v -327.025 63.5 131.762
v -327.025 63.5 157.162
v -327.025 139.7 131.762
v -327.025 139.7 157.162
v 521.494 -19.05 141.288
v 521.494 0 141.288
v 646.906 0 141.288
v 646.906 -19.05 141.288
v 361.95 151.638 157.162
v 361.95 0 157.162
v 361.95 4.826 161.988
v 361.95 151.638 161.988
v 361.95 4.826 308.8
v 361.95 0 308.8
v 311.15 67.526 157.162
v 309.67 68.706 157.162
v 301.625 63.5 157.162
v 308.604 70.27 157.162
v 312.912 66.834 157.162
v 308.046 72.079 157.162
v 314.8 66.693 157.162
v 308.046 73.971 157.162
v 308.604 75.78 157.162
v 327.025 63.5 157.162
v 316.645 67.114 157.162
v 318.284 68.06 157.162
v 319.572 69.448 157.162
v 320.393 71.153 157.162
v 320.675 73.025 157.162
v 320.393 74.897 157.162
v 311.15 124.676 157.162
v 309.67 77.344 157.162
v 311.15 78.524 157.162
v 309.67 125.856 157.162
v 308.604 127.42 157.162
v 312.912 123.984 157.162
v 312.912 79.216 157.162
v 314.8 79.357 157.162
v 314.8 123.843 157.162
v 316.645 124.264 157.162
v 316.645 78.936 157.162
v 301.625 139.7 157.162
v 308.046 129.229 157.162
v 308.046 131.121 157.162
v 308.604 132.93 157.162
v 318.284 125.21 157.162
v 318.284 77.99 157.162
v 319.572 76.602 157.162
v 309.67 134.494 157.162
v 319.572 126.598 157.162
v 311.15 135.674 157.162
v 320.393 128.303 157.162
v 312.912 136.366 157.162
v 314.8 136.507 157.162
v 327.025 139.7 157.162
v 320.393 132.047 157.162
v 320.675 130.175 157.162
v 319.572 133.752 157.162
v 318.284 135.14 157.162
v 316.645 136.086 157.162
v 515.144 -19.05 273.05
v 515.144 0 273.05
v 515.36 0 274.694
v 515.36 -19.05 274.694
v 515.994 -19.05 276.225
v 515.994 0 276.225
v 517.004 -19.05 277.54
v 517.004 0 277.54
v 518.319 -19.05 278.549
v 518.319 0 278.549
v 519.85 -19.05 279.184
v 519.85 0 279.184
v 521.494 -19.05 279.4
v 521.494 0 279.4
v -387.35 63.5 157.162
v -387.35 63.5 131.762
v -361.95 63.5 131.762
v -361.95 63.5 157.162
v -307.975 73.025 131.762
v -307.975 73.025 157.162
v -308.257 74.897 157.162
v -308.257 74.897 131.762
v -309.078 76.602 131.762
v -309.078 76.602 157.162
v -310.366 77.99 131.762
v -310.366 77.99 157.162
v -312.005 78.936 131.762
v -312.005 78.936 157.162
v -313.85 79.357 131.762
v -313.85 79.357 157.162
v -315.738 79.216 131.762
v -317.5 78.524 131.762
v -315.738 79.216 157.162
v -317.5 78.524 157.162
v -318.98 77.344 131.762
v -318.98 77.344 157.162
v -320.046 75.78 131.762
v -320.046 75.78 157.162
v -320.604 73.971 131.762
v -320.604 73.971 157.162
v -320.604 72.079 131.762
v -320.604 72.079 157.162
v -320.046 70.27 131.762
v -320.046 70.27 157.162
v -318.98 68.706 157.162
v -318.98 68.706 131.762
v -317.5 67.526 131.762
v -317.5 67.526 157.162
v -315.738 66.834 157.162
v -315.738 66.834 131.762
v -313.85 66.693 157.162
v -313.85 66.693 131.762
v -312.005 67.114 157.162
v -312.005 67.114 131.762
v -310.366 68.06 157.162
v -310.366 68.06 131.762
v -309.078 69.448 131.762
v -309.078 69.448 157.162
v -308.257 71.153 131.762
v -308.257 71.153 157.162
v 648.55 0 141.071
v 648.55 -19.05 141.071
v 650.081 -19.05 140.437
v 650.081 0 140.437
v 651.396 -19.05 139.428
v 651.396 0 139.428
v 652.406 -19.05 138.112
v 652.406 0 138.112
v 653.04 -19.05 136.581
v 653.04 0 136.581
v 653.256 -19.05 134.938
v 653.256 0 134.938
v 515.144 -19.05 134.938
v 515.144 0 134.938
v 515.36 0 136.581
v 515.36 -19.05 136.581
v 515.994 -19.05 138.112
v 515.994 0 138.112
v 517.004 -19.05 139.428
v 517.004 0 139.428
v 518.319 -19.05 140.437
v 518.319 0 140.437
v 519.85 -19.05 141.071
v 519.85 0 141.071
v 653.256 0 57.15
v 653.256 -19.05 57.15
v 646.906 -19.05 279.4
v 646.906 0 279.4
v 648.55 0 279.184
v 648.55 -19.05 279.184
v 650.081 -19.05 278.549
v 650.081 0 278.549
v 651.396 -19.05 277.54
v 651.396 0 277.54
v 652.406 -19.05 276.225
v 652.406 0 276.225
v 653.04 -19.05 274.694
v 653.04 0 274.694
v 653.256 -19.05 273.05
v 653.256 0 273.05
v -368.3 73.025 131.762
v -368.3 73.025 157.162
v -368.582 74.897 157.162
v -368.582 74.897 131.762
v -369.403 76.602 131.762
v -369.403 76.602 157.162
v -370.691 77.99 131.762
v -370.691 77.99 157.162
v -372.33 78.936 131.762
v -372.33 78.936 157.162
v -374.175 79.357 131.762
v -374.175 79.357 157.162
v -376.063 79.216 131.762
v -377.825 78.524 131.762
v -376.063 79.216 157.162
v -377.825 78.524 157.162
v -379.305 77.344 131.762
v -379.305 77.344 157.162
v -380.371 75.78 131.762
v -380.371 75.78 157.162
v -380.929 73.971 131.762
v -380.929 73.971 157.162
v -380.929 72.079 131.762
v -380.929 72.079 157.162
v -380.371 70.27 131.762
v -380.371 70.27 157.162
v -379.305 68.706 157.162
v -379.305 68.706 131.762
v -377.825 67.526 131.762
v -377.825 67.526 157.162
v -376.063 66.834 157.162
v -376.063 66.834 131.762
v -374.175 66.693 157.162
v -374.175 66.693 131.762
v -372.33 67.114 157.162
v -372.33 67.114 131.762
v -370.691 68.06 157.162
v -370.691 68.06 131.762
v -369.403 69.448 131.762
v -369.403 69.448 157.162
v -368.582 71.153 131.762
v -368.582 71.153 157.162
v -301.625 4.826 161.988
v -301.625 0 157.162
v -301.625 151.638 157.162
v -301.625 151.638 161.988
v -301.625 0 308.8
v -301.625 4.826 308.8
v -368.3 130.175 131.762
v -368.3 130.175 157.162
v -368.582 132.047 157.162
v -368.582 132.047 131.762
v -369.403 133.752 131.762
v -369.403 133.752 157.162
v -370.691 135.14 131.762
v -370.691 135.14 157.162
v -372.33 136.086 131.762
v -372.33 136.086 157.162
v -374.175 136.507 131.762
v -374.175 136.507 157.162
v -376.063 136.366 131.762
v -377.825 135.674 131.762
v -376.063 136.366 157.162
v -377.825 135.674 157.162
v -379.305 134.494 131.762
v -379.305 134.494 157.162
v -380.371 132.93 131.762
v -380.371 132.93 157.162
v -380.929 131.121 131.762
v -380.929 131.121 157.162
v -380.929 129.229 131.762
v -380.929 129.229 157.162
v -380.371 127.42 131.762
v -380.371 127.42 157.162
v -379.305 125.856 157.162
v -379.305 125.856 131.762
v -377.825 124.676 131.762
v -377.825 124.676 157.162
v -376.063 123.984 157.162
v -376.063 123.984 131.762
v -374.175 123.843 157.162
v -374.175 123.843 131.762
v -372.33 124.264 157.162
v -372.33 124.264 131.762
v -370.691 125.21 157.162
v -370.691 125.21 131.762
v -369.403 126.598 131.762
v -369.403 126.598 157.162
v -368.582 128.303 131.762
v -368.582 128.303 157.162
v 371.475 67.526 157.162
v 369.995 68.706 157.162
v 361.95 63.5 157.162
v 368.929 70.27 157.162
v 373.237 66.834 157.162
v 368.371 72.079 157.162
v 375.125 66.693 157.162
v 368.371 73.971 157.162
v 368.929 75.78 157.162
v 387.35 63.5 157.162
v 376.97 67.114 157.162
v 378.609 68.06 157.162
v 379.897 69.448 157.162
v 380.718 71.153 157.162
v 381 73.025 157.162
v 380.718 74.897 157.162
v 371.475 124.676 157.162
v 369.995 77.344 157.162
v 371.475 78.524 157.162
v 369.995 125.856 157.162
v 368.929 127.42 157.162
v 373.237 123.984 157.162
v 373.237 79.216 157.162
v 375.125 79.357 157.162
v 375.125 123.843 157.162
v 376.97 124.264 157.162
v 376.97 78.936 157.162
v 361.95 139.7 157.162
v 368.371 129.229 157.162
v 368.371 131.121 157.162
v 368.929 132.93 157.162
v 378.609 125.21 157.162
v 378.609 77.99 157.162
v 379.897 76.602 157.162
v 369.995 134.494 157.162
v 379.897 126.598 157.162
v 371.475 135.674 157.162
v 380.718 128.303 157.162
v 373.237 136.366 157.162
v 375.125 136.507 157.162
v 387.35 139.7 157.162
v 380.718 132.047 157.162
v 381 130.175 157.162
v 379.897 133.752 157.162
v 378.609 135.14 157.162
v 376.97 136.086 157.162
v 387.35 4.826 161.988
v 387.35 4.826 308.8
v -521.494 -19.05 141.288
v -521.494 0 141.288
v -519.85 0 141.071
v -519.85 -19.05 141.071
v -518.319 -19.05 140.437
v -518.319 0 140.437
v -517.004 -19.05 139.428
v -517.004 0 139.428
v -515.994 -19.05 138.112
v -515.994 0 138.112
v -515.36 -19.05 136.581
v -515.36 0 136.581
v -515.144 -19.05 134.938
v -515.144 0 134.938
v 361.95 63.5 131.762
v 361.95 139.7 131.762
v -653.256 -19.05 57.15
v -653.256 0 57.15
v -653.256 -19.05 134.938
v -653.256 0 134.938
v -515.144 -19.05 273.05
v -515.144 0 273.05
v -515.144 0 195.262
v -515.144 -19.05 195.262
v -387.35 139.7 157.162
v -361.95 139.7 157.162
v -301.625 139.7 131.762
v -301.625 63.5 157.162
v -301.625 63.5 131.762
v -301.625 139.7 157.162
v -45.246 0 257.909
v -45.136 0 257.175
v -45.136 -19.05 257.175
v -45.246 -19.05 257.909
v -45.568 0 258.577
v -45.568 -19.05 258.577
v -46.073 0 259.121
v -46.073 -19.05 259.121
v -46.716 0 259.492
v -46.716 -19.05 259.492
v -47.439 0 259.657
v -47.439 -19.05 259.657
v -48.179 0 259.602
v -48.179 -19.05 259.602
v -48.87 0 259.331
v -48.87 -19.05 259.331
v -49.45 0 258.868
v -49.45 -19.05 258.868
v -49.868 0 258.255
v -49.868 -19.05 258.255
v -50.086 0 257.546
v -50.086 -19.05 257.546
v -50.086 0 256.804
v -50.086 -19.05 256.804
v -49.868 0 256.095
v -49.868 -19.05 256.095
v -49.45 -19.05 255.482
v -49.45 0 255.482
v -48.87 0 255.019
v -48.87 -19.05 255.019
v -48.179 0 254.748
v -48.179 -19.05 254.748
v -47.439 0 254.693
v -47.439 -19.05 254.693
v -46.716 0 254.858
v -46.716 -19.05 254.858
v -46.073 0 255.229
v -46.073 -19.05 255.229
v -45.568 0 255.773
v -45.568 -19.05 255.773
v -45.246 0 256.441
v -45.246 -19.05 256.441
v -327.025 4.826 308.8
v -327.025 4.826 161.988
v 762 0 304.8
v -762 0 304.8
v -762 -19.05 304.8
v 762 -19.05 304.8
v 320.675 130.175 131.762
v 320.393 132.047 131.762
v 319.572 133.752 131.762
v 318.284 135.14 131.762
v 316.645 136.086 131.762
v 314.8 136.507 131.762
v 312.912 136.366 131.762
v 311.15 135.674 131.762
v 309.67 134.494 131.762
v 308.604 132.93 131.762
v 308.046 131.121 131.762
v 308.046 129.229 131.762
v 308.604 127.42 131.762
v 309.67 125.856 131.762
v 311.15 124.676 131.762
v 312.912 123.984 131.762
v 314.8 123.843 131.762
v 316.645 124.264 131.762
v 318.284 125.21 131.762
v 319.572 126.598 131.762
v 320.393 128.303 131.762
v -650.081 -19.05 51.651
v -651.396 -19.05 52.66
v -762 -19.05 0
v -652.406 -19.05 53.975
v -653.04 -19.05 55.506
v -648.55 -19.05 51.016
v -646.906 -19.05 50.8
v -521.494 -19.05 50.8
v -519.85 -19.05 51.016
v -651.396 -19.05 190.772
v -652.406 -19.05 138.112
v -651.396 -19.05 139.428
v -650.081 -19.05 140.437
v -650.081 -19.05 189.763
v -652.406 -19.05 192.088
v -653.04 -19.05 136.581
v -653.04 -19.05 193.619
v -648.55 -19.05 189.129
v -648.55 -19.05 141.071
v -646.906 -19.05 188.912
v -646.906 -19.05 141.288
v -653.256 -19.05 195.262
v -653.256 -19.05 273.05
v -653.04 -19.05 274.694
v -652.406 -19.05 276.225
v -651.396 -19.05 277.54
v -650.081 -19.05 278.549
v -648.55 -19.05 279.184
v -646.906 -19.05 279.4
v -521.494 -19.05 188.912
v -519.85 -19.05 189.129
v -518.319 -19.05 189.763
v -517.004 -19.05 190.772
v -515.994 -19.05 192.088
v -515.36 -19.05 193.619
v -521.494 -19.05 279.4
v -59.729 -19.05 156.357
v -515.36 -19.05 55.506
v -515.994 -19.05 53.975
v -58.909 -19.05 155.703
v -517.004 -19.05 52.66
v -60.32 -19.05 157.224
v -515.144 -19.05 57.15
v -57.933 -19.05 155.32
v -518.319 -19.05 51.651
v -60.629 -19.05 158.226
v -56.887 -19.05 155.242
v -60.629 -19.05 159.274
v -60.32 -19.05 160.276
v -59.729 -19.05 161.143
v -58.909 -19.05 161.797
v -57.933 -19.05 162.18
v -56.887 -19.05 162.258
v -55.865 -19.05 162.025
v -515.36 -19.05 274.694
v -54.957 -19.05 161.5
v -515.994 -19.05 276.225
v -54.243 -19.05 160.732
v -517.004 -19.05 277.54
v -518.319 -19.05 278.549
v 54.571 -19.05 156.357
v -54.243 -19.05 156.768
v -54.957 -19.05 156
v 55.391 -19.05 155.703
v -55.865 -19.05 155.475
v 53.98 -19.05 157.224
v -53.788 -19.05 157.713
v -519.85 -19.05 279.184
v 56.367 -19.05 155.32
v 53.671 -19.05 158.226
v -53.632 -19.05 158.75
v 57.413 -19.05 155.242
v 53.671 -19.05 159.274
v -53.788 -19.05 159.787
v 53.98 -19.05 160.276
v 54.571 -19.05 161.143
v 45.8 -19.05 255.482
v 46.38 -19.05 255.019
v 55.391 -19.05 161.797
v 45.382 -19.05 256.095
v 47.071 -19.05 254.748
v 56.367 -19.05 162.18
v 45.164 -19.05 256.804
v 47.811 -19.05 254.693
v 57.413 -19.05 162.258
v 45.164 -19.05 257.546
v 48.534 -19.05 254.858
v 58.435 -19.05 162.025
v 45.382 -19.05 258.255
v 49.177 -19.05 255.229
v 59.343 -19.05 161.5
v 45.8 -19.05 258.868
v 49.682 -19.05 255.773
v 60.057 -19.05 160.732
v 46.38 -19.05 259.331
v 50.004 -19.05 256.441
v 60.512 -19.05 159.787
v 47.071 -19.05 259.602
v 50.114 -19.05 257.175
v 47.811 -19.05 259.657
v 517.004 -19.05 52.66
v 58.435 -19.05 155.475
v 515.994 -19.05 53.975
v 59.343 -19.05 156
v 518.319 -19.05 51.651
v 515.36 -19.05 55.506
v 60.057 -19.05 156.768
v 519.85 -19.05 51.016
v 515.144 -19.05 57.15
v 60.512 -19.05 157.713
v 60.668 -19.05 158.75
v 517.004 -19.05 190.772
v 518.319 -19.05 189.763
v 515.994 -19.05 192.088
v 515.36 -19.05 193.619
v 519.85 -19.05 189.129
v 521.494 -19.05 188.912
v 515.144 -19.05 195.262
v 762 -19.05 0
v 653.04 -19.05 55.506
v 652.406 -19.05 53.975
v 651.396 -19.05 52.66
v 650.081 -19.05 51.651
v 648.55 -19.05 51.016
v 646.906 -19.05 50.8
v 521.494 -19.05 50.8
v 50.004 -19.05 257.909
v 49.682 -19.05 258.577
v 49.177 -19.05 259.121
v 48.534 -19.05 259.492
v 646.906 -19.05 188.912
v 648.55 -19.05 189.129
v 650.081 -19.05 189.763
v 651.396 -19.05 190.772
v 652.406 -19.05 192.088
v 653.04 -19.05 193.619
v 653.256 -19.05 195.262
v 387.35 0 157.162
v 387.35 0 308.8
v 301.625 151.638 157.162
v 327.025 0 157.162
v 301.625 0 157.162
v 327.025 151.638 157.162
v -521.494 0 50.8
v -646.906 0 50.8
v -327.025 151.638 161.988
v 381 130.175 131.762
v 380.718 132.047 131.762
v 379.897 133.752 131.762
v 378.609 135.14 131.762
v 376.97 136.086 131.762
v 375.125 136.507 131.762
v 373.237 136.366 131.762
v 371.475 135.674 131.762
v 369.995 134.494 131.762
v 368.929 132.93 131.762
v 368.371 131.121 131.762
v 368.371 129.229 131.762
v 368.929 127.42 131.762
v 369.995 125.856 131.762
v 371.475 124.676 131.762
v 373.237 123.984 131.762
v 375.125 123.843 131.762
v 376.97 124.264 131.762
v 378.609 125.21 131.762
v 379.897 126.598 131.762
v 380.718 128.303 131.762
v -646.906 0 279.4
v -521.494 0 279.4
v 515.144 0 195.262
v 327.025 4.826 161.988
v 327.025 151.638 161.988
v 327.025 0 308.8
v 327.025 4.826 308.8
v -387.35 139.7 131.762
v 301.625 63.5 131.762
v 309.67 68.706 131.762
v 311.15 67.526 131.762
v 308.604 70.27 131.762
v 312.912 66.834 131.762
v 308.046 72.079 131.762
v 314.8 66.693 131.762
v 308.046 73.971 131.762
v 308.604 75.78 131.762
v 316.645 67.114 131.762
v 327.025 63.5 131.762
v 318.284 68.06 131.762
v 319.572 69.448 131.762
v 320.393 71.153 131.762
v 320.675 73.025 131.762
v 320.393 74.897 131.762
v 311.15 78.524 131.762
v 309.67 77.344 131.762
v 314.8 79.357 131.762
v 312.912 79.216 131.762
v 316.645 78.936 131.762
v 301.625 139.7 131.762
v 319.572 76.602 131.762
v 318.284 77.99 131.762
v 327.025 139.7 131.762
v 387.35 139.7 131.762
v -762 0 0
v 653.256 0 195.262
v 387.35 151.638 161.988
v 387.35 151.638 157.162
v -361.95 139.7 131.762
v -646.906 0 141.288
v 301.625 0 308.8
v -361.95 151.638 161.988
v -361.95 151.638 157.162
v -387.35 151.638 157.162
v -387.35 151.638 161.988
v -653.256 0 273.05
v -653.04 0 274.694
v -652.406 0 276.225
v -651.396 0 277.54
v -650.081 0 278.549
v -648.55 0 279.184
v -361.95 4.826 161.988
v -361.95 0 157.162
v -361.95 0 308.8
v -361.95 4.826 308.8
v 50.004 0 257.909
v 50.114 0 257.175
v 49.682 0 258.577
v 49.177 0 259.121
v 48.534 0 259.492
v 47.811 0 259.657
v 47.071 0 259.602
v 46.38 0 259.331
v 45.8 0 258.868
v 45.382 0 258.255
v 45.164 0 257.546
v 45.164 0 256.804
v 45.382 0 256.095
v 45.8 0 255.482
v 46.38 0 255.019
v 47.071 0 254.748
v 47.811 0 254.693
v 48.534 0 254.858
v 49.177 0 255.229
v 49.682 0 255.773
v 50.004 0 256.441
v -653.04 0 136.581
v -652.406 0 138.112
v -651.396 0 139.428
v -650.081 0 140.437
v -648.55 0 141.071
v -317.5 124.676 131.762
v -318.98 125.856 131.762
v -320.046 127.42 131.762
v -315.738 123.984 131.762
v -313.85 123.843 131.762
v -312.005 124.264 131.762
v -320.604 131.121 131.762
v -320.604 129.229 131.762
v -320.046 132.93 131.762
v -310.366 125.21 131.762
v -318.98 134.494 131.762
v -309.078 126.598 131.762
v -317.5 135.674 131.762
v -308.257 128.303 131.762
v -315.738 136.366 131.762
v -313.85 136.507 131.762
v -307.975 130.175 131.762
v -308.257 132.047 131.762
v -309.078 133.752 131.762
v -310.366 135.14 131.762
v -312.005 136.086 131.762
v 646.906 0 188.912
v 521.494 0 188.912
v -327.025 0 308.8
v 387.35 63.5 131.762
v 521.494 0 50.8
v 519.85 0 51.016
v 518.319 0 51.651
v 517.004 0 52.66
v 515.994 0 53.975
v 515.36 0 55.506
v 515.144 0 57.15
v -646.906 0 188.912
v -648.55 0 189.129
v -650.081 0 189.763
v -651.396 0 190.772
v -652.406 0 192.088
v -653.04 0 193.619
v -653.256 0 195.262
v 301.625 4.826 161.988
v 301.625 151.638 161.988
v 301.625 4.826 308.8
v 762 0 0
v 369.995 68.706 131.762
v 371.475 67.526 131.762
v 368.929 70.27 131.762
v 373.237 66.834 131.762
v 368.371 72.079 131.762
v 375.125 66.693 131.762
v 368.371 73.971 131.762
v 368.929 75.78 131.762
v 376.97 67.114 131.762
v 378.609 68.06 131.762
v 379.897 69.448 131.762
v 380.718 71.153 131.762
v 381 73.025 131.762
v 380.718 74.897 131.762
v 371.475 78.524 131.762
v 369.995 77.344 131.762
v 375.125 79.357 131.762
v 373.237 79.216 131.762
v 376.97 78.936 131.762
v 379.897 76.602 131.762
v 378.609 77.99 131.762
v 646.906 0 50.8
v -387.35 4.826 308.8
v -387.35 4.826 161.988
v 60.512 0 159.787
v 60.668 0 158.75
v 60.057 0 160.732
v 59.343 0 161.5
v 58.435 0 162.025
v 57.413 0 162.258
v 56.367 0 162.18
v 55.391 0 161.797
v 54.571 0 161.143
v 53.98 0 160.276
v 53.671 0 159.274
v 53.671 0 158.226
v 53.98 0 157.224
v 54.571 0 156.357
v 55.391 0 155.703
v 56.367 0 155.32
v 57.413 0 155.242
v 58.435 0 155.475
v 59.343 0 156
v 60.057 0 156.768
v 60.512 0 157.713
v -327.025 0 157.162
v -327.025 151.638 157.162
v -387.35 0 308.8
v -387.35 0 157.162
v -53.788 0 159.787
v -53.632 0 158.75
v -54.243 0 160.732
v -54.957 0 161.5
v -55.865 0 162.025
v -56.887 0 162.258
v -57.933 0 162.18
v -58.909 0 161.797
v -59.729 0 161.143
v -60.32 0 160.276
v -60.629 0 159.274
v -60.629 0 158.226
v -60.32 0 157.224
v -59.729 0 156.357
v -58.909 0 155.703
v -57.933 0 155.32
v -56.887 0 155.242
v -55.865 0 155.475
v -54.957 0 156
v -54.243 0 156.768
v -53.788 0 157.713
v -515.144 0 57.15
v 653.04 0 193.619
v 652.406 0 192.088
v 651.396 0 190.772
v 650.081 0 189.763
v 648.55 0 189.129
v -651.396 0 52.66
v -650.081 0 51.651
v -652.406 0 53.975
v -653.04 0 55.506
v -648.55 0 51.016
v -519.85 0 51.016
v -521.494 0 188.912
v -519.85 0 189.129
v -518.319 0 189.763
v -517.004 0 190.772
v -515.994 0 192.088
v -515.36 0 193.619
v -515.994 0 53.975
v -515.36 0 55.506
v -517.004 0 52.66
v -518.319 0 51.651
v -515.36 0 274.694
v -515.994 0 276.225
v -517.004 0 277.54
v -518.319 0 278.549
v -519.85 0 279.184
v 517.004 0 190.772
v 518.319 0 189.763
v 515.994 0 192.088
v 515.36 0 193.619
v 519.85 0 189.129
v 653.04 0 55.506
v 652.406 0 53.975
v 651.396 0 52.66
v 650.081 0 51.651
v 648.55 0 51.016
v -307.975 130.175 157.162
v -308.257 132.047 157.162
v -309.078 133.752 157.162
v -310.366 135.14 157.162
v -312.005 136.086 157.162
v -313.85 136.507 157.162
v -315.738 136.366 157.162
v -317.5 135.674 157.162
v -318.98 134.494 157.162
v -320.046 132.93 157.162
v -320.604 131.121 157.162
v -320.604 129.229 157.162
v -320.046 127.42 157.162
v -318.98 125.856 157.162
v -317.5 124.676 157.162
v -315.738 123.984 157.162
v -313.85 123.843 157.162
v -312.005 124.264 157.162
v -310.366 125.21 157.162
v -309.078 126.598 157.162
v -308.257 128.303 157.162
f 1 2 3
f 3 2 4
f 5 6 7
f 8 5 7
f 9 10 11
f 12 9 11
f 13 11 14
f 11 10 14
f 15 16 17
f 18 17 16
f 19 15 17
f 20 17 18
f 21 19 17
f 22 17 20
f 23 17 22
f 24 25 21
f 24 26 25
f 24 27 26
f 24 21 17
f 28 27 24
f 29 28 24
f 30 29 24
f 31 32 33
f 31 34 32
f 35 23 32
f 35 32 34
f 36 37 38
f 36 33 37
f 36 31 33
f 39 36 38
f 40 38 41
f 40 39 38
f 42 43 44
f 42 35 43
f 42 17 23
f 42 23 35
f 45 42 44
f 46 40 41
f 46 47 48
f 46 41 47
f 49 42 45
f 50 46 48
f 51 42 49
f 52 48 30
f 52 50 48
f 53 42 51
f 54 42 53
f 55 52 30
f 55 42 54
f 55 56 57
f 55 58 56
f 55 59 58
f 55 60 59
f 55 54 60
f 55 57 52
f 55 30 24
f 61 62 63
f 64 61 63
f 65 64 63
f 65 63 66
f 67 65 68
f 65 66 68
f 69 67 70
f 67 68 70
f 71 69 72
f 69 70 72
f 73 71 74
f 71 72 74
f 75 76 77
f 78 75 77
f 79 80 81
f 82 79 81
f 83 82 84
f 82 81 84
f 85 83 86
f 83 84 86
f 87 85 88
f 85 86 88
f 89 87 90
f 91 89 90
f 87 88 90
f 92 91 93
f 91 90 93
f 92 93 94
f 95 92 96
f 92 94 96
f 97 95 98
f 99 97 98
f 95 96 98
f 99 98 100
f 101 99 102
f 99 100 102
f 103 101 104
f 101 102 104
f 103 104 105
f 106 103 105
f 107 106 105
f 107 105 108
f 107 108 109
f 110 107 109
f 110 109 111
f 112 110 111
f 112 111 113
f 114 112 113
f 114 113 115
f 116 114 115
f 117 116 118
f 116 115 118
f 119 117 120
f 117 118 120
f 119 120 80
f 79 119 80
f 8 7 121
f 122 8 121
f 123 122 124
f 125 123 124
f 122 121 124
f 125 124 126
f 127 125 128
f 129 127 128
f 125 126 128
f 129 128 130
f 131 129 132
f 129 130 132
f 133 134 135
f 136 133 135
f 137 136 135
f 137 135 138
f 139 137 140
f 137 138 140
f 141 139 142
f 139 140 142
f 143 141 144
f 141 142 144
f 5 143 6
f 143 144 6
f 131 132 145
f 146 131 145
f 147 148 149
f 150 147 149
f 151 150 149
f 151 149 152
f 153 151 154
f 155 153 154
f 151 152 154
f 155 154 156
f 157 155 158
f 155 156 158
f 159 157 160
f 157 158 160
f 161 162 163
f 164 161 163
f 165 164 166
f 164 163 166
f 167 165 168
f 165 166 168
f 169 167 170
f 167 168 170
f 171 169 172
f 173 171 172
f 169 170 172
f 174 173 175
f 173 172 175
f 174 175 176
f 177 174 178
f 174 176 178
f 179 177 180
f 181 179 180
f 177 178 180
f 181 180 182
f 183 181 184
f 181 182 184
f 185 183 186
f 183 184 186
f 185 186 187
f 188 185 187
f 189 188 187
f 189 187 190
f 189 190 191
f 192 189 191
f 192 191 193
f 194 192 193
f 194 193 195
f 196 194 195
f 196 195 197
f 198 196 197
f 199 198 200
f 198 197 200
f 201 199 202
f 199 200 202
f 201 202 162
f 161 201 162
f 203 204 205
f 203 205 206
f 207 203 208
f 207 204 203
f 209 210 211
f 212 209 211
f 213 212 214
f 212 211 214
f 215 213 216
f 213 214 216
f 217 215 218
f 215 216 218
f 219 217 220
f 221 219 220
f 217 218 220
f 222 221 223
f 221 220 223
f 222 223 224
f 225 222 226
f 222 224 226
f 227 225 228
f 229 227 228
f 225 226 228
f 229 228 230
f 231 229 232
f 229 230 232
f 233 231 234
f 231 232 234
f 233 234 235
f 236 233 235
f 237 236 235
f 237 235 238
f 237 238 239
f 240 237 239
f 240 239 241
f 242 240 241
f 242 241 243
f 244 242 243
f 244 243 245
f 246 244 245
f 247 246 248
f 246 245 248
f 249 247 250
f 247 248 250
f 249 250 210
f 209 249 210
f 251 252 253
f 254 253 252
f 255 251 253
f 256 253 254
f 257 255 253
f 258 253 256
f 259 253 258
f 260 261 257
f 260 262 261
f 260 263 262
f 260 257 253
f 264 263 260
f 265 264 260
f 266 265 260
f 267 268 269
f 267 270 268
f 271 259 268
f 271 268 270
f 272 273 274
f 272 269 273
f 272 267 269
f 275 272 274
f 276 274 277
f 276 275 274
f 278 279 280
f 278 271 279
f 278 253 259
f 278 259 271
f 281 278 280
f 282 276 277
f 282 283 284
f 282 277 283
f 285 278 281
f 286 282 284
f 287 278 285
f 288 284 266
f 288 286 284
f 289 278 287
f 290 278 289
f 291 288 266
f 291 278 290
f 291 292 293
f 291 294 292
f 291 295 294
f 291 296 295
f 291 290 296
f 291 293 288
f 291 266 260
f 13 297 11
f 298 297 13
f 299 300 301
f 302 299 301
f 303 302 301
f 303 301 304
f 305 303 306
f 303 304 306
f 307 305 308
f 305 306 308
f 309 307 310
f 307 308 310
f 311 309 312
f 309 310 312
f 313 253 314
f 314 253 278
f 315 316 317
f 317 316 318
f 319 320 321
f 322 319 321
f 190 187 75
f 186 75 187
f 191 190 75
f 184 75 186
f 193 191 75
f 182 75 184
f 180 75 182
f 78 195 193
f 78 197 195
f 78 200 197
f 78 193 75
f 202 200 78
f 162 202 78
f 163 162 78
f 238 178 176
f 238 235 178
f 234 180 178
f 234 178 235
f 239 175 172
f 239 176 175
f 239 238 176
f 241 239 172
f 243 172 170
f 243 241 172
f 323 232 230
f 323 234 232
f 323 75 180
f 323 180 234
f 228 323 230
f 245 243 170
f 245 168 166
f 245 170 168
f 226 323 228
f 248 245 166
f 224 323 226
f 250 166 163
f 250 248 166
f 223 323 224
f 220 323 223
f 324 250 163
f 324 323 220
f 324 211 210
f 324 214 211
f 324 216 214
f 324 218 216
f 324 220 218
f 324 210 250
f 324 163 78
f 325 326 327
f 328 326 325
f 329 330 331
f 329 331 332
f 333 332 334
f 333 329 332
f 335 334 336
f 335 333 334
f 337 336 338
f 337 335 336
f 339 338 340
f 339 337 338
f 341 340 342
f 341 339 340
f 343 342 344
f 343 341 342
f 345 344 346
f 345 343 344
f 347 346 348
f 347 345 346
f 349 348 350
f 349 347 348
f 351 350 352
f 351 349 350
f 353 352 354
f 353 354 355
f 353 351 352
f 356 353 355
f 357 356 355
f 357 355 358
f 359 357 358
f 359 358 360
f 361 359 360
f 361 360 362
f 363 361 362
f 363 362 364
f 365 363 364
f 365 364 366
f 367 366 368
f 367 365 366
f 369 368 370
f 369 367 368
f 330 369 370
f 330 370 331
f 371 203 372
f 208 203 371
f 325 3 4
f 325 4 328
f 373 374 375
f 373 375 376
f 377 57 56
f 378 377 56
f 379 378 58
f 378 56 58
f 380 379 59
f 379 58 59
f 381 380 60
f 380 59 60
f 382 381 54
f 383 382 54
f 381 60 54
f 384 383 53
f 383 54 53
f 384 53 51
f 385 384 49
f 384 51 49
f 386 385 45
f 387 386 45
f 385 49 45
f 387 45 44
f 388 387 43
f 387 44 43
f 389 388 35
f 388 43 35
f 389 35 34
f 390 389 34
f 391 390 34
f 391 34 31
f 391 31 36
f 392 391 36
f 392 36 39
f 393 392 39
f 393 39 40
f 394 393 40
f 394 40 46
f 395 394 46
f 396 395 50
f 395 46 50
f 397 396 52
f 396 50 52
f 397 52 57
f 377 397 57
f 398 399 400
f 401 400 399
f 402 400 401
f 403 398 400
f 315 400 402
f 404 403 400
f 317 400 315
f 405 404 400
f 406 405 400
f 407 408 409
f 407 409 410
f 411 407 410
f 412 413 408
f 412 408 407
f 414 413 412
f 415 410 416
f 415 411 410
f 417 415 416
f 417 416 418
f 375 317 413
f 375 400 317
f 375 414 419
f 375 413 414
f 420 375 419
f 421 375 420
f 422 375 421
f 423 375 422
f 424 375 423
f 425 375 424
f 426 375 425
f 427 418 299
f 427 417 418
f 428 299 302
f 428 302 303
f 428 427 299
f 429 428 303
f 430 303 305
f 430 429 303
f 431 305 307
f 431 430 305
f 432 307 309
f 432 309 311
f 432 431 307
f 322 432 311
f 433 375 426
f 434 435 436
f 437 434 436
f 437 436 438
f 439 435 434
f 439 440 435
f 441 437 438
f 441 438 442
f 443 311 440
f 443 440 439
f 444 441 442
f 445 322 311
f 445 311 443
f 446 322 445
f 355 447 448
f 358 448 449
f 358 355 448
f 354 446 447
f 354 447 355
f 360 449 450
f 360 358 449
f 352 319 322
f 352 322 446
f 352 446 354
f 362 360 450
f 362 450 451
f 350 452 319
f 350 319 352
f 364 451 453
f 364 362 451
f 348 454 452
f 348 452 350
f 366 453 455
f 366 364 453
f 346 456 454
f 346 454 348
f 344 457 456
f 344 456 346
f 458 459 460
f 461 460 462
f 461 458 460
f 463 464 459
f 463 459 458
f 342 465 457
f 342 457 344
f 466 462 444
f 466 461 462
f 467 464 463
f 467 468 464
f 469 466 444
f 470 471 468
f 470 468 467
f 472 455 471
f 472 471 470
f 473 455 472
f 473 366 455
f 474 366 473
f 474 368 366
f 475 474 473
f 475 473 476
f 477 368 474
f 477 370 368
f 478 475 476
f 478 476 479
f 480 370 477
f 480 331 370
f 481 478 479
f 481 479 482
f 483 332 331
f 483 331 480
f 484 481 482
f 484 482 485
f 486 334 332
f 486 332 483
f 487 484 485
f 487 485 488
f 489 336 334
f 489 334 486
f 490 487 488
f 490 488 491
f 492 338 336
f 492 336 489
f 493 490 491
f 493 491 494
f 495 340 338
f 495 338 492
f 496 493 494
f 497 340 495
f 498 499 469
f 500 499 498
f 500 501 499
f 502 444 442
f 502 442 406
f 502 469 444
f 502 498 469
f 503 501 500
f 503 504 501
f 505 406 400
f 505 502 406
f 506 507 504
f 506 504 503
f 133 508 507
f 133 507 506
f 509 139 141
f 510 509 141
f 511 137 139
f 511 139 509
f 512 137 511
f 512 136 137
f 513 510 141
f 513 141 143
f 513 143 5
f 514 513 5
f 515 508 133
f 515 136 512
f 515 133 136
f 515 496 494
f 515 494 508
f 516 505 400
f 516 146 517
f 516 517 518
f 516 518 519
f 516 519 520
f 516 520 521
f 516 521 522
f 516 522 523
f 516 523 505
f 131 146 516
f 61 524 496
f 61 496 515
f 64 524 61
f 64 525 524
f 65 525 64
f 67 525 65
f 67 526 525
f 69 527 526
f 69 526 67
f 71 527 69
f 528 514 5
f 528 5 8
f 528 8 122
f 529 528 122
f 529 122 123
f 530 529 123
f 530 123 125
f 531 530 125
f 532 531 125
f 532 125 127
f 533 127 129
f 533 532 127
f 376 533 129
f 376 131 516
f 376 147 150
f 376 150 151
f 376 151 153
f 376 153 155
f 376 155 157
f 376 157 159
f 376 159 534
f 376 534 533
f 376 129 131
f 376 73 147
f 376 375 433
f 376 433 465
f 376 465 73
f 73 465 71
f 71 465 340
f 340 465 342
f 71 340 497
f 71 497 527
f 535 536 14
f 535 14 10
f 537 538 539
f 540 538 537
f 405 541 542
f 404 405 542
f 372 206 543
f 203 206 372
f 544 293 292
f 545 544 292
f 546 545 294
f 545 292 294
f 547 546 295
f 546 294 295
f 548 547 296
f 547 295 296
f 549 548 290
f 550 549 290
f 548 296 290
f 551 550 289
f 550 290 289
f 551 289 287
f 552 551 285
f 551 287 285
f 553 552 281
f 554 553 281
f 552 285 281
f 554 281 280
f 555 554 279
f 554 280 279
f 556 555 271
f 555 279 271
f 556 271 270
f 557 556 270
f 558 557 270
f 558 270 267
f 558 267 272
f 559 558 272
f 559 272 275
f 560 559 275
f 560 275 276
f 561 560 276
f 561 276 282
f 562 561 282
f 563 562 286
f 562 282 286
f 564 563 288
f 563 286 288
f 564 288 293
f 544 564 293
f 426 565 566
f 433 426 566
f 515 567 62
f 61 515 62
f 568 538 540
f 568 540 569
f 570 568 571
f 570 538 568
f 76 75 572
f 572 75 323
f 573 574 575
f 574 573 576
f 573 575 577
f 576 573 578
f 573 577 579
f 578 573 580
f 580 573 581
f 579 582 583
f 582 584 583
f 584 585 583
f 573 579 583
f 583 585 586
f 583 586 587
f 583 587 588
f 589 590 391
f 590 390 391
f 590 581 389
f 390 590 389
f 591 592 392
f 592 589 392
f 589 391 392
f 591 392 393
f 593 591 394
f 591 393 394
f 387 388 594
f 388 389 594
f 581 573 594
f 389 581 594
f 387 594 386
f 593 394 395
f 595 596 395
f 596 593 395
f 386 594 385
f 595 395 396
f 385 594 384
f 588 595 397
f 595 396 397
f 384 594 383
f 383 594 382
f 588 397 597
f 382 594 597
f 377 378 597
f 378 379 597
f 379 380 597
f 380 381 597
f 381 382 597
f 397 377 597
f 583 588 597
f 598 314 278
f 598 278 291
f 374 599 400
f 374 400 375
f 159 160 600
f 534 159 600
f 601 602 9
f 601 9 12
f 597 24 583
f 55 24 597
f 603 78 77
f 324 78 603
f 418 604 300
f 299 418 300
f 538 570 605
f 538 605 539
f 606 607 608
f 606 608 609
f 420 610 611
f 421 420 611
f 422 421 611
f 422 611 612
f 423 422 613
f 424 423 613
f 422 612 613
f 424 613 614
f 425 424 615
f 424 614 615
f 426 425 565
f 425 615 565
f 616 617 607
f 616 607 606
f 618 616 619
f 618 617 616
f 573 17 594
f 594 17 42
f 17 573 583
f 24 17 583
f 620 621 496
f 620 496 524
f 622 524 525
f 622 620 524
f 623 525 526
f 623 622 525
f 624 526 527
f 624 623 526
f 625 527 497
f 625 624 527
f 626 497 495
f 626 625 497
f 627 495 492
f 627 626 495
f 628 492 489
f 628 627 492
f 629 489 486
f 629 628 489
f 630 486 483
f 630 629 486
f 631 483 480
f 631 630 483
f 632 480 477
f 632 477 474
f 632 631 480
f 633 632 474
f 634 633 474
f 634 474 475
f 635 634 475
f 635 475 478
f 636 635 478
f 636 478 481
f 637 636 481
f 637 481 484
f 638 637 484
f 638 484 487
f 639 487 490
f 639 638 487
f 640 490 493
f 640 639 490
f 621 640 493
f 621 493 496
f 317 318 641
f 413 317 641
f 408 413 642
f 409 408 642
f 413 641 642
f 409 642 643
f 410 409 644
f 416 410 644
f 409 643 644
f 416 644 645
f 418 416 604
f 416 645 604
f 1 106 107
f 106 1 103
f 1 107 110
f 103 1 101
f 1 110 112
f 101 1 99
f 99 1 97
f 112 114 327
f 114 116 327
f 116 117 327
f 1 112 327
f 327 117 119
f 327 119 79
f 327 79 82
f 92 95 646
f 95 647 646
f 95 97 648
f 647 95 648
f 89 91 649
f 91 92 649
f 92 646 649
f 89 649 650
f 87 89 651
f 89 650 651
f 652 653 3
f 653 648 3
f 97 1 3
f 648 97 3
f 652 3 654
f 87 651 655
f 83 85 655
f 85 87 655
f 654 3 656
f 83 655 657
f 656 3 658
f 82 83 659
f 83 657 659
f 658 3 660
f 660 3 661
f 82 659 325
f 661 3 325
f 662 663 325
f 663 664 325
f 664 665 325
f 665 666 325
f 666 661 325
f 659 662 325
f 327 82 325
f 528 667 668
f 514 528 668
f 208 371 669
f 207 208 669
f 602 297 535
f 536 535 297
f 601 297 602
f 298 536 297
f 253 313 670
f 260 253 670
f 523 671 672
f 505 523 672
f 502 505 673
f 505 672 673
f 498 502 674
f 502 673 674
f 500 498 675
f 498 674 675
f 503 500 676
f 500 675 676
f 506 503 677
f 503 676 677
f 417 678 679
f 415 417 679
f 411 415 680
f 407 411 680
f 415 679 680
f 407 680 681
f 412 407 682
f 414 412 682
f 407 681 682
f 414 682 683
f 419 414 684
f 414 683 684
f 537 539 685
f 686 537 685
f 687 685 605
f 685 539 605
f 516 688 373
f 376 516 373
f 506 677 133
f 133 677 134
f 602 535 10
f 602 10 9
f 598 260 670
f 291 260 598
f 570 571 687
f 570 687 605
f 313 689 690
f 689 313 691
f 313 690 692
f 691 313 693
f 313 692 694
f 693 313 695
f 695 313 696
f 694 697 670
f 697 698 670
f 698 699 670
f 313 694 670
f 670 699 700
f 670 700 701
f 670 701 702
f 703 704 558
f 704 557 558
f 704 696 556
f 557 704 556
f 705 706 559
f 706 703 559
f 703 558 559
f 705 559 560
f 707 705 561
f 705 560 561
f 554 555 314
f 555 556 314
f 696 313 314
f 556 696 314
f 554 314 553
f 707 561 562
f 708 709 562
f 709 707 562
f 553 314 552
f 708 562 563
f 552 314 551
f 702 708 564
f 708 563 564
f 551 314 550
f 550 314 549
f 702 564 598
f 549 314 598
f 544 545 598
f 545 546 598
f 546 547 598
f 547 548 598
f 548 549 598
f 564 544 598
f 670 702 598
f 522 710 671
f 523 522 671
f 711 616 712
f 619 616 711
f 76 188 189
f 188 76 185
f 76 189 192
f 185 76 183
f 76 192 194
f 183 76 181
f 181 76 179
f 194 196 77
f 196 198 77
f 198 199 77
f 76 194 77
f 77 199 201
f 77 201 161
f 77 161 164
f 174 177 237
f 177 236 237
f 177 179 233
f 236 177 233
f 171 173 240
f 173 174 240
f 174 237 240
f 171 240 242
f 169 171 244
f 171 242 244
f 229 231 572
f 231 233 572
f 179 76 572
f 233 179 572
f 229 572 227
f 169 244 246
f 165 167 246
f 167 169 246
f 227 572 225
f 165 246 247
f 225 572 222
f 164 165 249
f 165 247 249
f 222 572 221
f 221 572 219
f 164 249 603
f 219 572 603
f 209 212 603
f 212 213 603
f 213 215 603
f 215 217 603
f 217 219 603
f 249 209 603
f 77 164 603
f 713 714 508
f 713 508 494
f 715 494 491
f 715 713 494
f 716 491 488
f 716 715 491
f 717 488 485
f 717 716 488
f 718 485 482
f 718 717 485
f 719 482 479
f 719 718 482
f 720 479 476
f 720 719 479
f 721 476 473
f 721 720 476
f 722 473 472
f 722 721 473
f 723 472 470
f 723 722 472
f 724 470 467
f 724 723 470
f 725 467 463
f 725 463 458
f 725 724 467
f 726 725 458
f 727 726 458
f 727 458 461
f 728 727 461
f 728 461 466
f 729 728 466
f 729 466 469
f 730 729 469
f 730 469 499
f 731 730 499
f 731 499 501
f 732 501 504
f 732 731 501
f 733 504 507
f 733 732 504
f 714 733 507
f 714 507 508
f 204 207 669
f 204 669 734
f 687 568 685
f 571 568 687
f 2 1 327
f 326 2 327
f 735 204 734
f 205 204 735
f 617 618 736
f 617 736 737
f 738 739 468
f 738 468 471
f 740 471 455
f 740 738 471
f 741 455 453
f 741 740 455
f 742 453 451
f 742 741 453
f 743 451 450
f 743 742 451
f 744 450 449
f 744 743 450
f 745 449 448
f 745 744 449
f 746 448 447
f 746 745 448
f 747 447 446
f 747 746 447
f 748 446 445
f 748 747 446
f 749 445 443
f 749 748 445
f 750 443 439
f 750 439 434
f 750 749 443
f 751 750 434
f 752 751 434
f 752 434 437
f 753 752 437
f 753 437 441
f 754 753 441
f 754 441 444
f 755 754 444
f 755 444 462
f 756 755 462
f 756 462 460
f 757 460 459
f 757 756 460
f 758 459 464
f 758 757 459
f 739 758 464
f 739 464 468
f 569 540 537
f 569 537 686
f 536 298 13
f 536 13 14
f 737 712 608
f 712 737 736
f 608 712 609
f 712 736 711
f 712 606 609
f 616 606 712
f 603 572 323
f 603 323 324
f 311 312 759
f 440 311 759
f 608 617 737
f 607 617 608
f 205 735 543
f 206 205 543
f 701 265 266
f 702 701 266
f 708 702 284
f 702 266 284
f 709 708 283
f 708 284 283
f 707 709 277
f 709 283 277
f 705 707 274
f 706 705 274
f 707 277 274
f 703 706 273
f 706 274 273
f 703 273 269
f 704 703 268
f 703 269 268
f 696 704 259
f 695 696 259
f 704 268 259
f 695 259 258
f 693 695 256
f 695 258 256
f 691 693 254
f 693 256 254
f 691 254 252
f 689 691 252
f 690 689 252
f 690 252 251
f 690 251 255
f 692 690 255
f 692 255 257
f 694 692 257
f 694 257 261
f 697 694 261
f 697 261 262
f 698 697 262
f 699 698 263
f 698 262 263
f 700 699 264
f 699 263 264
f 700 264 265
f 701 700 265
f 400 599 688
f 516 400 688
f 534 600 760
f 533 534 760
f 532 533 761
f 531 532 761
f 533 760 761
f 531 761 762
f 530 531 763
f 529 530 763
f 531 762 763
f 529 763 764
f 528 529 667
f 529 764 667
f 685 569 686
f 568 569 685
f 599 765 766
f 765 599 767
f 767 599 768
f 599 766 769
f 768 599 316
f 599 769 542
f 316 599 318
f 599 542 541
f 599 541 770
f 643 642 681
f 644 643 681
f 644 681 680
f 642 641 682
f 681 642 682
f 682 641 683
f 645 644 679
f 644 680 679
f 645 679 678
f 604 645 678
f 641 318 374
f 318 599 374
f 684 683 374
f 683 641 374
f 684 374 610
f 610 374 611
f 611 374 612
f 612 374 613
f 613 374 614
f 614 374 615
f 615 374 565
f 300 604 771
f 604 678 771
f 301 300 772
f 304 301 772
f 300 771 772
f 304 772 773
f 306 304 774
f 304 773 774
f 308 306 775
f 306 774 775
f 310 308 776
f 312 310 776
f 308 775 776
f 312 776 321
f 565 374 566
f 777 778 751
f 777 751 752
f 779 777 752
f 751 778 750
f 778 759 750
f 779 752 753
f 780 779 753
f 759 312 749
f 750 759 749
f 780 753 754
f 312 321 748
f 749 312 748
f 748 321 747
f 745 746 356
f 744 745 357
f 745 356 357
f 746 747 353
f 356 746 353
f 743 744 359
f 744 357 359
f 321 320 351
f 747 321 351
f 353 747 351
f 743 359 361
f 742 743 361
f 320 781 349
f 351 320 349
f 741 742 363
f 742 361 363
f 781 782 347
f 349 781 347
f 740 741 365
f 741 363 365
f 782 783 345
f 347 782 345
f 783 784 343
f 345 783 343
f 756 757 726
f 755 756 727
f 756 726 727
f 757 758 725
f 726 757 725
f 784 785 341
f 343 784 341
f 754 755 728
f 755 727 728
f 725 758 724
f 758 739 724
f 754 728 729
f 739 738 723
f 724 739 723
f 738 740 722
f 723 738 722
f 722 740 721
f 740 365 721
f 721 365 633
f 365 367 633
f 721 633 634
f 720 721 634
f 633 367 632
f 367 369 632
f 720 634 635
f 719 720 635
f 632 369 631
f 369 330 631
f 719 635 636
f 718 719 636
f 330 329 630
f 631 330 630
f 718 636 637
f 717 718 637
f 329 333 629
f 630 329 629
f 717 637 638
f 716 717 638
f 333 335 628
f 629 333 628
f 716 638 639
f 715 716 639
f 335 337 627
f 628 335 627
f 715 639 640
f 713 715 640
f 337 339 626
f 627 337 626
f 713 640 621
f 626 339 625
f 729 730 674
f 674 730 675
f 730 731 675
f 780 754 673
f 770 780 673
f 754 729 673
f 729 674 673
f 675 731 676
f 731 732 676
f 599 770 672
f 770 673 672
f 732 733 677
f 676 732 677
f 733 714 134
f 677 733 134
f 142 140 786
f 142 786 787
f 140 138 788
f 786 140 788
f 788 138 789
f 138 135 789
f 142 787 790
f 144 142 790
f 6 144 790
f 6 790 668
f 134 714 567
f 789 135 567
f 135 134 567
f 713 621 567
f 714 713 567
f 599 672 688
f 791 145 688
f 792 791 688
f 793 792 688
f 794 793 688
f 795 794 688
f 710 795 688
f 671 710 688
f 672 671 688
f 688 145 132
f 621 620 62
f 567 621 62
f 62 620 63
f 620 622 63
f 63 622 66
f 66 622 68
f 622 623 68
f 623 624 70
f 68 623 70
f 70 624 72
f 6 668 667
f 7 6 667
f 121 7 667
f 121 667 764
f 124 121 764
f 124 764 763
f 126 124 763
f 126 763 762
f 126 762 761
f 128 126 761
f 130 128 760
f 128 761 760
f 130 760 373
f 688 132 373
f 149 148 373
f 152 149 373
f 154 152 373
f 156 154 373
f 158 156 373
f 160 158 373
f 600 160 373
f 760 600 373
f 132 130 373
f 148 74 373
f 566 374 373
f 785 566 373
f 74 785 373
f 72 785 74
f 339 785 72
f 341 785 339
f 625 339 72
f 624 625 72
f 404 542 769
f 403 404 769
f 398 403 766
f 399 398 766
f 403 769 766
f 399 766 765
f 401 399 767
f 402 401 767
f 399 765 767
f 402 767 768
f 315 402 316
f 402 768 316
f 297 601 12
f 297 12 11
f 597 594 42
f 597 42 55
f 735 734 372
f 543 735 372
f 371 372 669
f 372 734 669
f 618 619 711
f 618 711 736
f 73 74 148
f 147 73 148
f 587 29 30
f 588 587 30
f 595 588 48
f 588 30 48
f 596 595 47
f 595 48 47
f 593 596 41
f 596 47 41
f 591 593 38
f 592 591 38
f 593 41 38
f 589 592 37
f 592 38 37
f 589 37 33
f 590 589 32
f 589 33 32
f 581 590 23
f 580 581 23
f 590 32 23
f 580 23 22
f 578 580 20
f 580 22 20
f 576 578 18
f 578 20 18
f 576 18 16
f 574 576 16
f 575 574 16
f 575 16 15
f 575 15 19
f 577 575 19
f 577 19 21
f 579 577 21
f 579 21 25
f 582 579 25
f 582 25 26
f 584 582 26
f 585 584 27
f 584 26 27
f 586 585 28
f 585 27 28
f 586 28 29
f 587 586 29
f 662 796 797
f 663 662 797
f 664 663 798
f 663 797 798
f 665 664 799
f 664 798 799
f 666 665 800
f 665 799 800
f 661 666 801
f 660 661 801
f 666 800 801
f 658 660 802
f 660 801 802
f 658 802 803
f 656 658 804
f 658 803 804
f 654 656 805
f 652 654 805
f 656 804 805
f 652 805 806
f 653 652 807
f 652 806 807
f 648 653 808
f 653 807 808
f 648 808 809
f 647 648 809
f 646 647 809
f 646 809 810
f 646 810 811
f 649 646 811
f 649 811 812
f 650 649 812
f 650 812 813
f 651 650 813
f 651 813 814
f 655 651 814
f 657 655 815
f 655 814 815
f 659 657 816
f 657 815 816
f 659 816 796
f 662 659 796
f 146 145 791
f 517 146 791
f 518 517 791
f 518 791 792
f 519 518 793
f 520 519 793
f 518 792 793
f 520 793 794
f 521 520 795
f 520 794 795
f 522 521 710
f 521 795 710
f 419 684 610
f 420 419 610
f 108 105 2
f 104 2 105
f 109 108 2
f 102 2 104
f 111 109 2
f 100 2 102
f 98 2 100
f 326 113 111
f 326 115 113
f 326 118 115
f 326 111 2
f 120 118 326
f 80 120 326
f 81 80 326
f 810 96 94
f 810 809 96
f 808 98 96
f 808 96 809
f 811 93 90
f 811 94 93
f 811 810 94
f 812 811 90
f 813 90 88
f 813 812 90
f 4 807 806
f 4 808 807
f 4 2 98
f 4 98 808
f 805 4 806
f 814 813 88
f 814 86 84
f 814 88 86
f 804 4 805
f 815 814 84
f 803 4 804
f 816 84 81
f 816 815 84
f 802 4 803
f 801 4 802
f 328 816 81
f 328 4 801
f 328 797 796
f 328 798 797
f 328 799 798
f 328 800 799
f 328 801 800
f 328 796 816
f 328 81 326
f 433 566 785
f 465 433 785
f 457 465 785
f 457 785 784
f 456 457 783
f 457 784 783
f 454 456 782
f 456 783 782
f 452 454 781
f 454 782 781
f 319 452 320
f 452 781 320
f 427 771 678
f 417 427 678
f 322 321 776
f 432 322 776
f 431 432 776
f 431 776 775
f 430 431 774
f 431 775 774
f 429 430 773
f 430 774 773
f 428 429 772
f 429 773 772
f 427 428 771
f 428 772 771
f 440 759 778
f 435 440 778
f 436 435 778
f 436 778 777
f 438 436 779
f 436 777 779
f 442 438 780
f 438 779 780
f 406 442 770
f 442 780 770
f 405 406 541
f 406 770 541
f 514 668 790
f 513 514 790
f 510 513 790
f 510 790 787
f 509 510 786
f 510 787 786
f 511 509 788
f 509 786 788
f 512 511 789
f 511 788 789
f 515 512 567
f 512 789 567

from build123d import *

# Parameters (mm, degrees)
F0_W     = 1524
F0_H     = 304.8
F0_R     = 3.5179
F0_R_2   = 2.4892
F1_DEPTH = 19.05
F3_W     = 25.4
F3_H     = 76.2
F3_R     = 6.35
F4_DEPTH = 25.4
F6_DEPTH = 387.35
F7_W     = 34.925
F7_H     = 156.405198
F7_W_2   = 603.25
F7_H_2   = 168.995904
F7_H_3   = 172.44594
F8_DEPTH = 151.638


with BuildPart() as f1:
    # F0 (on Front) → F1 (new body)
    with BuildSketch(Plane.XZ):
        with Locations((0, 152.4)):
            Rectangle(F0_W, F0_H)
        with BuildLine():
            ThreePointArc((-653.25625, 134.9375), (-651.396378, 139.427628), (-646.90625, 141.2875))
            Line((-646.90625, 141.2875), (-521.49375, 141.2875))
            ThreePointArc((-521.49375, 141.2875), (-517.003622, 139.427628), (-515.14375, 134.9375))
            Line((-515.14375, 134.9375), (-515.14375, 57.15))
            ThreePointArc((-515.14375, 57.15), (-517.003622, 52.659872), (-521.49375, 50.8))
            Line((-521.49375, 50.8), (-646.90625, 50.8))
            ThreePointArc((-646.90625, 50.8), (-651.396378, 52.659872), (-653.25625, 57.15))
            Line((-653.25625, 57.15), (-653.25625, 134.9375))
        make_face(mode=Mode.SUBTRACT)
        with BuildLine():
            Line((646.90625, 50.8), (521.49375, 50.8))
            ThreePointArc((521.49375, 50.8), (517.003622, 52.659872), (515.14375, 57.15))
            Line((515.14375, 57.15), (515.14375, 134.9375))
            ThreePointArc((515.14375, 134.9375), (517.003622, 139.427628), (521.49375, 141.2875))
            Line((521.49375, 141.2875), (646.90625, 141.2875))
            ThreePointArc((646.90625, 141.2875), (651.396378, 139.427628), (653.25625, 134.9375))
            Line((653.25625, 134.9375), (653.25625, 57.15))
            ThreePointArc((653.25625, 57.15), (651.396378, 52.659872), (646.90625, 50.8))
        make_face(mode=Mode.SUBTRACT)
        with Locations((-57.15, 158.75)):
            Circle(F0_R, mode=Mode.SUBTRACT)
        with BuildLine():
            ThreePointArc((-653.25625, 273.05), (-651.396378, 277.540128), (-646.90625, 279.4))
            Line((-646.90625, 279.4), (-521.49375, 279.4))
            ThreePointArc((-521.49375, 279.4), (-517.003622, 277.540128), (-515.14375, 273.05))
            Line((-515.14375, 273.05), (-515.14375, 195.2625))
            ThreePointArc((-515.14375, 195.2625), (-517.003622, 190.772372), (-521.49375, 188.9125))
            Line((-521.49375, 188.9125), (-646.90625, 188.9125))
            ThreePointArc((-646.90625, 188.9125), (-651.396378, 190.772372), (-653.25625, 195.2625))
            Line((-653.25625, 195.2625), (-653.25625, 273.05))
        make_face(mode=Mode.SUBTRACT)
        with Locations((-47.625, 257.175)):
            Circle(F0_R_2, mode=Mode.SUBTRACT)
        with Locations((57.15, 158.75)):
            Circle(F0_R, mode=Mode.SUBTRACT)
        with Locations((47.625, 257.175)):
            Circle(F0_R_2, mode=Mode.SUBTRACT)
        with BuildLine():
            Line((653.25625, 273.05), (653.25625, 195.2625))
            ThreePointArc((653.25625, 195.2625), (651.396378, 190.772372), (646.90625, 188.9125))
            Line((646.90625, 188.9125), (521.49375, 188.9125))
            ThreePointArc((521.49375, 188.9125), (517.003622, 190.772372), (515.14375, 195.2625))
            Line((515.14375, 195.2625), (515.14375, 273.05))
            ThreePointArc((515.14375, 273.05), (517.003622, 277.540128), (521.49375, 279.4))
            Line((521.49375, 279.4), (646.90625, 279.4))
            ThreePointArc((646.90625, 279.4), (651.396378, 277.540128), (653.25625, 273.05))
        make_face(mode=Mode.SUBTRACT)
    extrude(amount=F1_DEPTH)


with BuildPart() as f4:
    # F3 (on face) → F4 (new body)
    with BuildSketch(Plane.XY.offset(157.1625)):
        with Locations((-374.65, 101.6)):
            Rectangle(F3_W, F3_H)
        with Locations((-374.65, 73.025)):
            Circle(F3_R, mode=Mode.SUBTRACT)
        with Locations((-374.65, 130.175)):
            Circle(F3_R, mode=Mode.SUBTRACT)
        with Locations((-314.325, 101.6)):
            Rectangle(F3_W, F3_H)
        with Locations((-314.325, 73.025)):
            Circle(F3_R, mode=Mode.SUBTRACT)
        with Locations((-314.325, 130.175)):
            Circle(F3_R, mode=Mode.SUBTRACT)
        with Locations((374.65, 101.6)):
            Rectangle(F3_W, F3_H)
        with Locations((374.65, 73.025)):
            Circle(F3_R, mode=Mode.SUBTRACT)
        with Locations((374.65, 130.175)):
            Circle(F3_R, mode=Mode.SUBTRACT)
        with Locations((314.325, 101.6)):
            Rectangle(F3_W, F3_H)
        with Locations((314.325, 73.025)):
            Circle(F3_R, mode=Mode.SUBTRACT)
        with Locations((314.325, 130.175)):
            Circle(F3_R, mode=Mode.SUBTRACT)
    extrude(amount=-F4_DEPTH)


with BuildPart() as f6:
    # F5 (on Right) → F6 (new body, symmetric)
    with BuildSketch(Plane.YZ):
        Polygon((0, 161.9885), (0, 157.1625), (4.826, 157.1625), (151.638, 157.1625), (151.638, 161.9885), (4.826, 161.9885), (4.826, 308.8005), (0, 308.8005), align=None)
    extrude(amount=F6_DEPTH, both=True)

    # F7 (on face) → F8 (cut, through all)
    with BuildSketch(Plane(origin=(0, 0, 0), x_dir=(-1, 0, 0), z_dir=(0, 1, 0))):
        with Locations((344.4875, 235.365099)):
            Rectangle(F7_W, F7_H)
        with Locations((0, 241.660452)):
            Rectangle(F7_W_2, F7_H_2)
        with Locations((-344.4875, 243.38547)):
            Rectangle(F7_W, F7_H_3)
    extrude(amount=F8_DEPTH, mode=Mode.SUBTRACT)


solid = Compound([f1.part, f4.part, f6.part])
